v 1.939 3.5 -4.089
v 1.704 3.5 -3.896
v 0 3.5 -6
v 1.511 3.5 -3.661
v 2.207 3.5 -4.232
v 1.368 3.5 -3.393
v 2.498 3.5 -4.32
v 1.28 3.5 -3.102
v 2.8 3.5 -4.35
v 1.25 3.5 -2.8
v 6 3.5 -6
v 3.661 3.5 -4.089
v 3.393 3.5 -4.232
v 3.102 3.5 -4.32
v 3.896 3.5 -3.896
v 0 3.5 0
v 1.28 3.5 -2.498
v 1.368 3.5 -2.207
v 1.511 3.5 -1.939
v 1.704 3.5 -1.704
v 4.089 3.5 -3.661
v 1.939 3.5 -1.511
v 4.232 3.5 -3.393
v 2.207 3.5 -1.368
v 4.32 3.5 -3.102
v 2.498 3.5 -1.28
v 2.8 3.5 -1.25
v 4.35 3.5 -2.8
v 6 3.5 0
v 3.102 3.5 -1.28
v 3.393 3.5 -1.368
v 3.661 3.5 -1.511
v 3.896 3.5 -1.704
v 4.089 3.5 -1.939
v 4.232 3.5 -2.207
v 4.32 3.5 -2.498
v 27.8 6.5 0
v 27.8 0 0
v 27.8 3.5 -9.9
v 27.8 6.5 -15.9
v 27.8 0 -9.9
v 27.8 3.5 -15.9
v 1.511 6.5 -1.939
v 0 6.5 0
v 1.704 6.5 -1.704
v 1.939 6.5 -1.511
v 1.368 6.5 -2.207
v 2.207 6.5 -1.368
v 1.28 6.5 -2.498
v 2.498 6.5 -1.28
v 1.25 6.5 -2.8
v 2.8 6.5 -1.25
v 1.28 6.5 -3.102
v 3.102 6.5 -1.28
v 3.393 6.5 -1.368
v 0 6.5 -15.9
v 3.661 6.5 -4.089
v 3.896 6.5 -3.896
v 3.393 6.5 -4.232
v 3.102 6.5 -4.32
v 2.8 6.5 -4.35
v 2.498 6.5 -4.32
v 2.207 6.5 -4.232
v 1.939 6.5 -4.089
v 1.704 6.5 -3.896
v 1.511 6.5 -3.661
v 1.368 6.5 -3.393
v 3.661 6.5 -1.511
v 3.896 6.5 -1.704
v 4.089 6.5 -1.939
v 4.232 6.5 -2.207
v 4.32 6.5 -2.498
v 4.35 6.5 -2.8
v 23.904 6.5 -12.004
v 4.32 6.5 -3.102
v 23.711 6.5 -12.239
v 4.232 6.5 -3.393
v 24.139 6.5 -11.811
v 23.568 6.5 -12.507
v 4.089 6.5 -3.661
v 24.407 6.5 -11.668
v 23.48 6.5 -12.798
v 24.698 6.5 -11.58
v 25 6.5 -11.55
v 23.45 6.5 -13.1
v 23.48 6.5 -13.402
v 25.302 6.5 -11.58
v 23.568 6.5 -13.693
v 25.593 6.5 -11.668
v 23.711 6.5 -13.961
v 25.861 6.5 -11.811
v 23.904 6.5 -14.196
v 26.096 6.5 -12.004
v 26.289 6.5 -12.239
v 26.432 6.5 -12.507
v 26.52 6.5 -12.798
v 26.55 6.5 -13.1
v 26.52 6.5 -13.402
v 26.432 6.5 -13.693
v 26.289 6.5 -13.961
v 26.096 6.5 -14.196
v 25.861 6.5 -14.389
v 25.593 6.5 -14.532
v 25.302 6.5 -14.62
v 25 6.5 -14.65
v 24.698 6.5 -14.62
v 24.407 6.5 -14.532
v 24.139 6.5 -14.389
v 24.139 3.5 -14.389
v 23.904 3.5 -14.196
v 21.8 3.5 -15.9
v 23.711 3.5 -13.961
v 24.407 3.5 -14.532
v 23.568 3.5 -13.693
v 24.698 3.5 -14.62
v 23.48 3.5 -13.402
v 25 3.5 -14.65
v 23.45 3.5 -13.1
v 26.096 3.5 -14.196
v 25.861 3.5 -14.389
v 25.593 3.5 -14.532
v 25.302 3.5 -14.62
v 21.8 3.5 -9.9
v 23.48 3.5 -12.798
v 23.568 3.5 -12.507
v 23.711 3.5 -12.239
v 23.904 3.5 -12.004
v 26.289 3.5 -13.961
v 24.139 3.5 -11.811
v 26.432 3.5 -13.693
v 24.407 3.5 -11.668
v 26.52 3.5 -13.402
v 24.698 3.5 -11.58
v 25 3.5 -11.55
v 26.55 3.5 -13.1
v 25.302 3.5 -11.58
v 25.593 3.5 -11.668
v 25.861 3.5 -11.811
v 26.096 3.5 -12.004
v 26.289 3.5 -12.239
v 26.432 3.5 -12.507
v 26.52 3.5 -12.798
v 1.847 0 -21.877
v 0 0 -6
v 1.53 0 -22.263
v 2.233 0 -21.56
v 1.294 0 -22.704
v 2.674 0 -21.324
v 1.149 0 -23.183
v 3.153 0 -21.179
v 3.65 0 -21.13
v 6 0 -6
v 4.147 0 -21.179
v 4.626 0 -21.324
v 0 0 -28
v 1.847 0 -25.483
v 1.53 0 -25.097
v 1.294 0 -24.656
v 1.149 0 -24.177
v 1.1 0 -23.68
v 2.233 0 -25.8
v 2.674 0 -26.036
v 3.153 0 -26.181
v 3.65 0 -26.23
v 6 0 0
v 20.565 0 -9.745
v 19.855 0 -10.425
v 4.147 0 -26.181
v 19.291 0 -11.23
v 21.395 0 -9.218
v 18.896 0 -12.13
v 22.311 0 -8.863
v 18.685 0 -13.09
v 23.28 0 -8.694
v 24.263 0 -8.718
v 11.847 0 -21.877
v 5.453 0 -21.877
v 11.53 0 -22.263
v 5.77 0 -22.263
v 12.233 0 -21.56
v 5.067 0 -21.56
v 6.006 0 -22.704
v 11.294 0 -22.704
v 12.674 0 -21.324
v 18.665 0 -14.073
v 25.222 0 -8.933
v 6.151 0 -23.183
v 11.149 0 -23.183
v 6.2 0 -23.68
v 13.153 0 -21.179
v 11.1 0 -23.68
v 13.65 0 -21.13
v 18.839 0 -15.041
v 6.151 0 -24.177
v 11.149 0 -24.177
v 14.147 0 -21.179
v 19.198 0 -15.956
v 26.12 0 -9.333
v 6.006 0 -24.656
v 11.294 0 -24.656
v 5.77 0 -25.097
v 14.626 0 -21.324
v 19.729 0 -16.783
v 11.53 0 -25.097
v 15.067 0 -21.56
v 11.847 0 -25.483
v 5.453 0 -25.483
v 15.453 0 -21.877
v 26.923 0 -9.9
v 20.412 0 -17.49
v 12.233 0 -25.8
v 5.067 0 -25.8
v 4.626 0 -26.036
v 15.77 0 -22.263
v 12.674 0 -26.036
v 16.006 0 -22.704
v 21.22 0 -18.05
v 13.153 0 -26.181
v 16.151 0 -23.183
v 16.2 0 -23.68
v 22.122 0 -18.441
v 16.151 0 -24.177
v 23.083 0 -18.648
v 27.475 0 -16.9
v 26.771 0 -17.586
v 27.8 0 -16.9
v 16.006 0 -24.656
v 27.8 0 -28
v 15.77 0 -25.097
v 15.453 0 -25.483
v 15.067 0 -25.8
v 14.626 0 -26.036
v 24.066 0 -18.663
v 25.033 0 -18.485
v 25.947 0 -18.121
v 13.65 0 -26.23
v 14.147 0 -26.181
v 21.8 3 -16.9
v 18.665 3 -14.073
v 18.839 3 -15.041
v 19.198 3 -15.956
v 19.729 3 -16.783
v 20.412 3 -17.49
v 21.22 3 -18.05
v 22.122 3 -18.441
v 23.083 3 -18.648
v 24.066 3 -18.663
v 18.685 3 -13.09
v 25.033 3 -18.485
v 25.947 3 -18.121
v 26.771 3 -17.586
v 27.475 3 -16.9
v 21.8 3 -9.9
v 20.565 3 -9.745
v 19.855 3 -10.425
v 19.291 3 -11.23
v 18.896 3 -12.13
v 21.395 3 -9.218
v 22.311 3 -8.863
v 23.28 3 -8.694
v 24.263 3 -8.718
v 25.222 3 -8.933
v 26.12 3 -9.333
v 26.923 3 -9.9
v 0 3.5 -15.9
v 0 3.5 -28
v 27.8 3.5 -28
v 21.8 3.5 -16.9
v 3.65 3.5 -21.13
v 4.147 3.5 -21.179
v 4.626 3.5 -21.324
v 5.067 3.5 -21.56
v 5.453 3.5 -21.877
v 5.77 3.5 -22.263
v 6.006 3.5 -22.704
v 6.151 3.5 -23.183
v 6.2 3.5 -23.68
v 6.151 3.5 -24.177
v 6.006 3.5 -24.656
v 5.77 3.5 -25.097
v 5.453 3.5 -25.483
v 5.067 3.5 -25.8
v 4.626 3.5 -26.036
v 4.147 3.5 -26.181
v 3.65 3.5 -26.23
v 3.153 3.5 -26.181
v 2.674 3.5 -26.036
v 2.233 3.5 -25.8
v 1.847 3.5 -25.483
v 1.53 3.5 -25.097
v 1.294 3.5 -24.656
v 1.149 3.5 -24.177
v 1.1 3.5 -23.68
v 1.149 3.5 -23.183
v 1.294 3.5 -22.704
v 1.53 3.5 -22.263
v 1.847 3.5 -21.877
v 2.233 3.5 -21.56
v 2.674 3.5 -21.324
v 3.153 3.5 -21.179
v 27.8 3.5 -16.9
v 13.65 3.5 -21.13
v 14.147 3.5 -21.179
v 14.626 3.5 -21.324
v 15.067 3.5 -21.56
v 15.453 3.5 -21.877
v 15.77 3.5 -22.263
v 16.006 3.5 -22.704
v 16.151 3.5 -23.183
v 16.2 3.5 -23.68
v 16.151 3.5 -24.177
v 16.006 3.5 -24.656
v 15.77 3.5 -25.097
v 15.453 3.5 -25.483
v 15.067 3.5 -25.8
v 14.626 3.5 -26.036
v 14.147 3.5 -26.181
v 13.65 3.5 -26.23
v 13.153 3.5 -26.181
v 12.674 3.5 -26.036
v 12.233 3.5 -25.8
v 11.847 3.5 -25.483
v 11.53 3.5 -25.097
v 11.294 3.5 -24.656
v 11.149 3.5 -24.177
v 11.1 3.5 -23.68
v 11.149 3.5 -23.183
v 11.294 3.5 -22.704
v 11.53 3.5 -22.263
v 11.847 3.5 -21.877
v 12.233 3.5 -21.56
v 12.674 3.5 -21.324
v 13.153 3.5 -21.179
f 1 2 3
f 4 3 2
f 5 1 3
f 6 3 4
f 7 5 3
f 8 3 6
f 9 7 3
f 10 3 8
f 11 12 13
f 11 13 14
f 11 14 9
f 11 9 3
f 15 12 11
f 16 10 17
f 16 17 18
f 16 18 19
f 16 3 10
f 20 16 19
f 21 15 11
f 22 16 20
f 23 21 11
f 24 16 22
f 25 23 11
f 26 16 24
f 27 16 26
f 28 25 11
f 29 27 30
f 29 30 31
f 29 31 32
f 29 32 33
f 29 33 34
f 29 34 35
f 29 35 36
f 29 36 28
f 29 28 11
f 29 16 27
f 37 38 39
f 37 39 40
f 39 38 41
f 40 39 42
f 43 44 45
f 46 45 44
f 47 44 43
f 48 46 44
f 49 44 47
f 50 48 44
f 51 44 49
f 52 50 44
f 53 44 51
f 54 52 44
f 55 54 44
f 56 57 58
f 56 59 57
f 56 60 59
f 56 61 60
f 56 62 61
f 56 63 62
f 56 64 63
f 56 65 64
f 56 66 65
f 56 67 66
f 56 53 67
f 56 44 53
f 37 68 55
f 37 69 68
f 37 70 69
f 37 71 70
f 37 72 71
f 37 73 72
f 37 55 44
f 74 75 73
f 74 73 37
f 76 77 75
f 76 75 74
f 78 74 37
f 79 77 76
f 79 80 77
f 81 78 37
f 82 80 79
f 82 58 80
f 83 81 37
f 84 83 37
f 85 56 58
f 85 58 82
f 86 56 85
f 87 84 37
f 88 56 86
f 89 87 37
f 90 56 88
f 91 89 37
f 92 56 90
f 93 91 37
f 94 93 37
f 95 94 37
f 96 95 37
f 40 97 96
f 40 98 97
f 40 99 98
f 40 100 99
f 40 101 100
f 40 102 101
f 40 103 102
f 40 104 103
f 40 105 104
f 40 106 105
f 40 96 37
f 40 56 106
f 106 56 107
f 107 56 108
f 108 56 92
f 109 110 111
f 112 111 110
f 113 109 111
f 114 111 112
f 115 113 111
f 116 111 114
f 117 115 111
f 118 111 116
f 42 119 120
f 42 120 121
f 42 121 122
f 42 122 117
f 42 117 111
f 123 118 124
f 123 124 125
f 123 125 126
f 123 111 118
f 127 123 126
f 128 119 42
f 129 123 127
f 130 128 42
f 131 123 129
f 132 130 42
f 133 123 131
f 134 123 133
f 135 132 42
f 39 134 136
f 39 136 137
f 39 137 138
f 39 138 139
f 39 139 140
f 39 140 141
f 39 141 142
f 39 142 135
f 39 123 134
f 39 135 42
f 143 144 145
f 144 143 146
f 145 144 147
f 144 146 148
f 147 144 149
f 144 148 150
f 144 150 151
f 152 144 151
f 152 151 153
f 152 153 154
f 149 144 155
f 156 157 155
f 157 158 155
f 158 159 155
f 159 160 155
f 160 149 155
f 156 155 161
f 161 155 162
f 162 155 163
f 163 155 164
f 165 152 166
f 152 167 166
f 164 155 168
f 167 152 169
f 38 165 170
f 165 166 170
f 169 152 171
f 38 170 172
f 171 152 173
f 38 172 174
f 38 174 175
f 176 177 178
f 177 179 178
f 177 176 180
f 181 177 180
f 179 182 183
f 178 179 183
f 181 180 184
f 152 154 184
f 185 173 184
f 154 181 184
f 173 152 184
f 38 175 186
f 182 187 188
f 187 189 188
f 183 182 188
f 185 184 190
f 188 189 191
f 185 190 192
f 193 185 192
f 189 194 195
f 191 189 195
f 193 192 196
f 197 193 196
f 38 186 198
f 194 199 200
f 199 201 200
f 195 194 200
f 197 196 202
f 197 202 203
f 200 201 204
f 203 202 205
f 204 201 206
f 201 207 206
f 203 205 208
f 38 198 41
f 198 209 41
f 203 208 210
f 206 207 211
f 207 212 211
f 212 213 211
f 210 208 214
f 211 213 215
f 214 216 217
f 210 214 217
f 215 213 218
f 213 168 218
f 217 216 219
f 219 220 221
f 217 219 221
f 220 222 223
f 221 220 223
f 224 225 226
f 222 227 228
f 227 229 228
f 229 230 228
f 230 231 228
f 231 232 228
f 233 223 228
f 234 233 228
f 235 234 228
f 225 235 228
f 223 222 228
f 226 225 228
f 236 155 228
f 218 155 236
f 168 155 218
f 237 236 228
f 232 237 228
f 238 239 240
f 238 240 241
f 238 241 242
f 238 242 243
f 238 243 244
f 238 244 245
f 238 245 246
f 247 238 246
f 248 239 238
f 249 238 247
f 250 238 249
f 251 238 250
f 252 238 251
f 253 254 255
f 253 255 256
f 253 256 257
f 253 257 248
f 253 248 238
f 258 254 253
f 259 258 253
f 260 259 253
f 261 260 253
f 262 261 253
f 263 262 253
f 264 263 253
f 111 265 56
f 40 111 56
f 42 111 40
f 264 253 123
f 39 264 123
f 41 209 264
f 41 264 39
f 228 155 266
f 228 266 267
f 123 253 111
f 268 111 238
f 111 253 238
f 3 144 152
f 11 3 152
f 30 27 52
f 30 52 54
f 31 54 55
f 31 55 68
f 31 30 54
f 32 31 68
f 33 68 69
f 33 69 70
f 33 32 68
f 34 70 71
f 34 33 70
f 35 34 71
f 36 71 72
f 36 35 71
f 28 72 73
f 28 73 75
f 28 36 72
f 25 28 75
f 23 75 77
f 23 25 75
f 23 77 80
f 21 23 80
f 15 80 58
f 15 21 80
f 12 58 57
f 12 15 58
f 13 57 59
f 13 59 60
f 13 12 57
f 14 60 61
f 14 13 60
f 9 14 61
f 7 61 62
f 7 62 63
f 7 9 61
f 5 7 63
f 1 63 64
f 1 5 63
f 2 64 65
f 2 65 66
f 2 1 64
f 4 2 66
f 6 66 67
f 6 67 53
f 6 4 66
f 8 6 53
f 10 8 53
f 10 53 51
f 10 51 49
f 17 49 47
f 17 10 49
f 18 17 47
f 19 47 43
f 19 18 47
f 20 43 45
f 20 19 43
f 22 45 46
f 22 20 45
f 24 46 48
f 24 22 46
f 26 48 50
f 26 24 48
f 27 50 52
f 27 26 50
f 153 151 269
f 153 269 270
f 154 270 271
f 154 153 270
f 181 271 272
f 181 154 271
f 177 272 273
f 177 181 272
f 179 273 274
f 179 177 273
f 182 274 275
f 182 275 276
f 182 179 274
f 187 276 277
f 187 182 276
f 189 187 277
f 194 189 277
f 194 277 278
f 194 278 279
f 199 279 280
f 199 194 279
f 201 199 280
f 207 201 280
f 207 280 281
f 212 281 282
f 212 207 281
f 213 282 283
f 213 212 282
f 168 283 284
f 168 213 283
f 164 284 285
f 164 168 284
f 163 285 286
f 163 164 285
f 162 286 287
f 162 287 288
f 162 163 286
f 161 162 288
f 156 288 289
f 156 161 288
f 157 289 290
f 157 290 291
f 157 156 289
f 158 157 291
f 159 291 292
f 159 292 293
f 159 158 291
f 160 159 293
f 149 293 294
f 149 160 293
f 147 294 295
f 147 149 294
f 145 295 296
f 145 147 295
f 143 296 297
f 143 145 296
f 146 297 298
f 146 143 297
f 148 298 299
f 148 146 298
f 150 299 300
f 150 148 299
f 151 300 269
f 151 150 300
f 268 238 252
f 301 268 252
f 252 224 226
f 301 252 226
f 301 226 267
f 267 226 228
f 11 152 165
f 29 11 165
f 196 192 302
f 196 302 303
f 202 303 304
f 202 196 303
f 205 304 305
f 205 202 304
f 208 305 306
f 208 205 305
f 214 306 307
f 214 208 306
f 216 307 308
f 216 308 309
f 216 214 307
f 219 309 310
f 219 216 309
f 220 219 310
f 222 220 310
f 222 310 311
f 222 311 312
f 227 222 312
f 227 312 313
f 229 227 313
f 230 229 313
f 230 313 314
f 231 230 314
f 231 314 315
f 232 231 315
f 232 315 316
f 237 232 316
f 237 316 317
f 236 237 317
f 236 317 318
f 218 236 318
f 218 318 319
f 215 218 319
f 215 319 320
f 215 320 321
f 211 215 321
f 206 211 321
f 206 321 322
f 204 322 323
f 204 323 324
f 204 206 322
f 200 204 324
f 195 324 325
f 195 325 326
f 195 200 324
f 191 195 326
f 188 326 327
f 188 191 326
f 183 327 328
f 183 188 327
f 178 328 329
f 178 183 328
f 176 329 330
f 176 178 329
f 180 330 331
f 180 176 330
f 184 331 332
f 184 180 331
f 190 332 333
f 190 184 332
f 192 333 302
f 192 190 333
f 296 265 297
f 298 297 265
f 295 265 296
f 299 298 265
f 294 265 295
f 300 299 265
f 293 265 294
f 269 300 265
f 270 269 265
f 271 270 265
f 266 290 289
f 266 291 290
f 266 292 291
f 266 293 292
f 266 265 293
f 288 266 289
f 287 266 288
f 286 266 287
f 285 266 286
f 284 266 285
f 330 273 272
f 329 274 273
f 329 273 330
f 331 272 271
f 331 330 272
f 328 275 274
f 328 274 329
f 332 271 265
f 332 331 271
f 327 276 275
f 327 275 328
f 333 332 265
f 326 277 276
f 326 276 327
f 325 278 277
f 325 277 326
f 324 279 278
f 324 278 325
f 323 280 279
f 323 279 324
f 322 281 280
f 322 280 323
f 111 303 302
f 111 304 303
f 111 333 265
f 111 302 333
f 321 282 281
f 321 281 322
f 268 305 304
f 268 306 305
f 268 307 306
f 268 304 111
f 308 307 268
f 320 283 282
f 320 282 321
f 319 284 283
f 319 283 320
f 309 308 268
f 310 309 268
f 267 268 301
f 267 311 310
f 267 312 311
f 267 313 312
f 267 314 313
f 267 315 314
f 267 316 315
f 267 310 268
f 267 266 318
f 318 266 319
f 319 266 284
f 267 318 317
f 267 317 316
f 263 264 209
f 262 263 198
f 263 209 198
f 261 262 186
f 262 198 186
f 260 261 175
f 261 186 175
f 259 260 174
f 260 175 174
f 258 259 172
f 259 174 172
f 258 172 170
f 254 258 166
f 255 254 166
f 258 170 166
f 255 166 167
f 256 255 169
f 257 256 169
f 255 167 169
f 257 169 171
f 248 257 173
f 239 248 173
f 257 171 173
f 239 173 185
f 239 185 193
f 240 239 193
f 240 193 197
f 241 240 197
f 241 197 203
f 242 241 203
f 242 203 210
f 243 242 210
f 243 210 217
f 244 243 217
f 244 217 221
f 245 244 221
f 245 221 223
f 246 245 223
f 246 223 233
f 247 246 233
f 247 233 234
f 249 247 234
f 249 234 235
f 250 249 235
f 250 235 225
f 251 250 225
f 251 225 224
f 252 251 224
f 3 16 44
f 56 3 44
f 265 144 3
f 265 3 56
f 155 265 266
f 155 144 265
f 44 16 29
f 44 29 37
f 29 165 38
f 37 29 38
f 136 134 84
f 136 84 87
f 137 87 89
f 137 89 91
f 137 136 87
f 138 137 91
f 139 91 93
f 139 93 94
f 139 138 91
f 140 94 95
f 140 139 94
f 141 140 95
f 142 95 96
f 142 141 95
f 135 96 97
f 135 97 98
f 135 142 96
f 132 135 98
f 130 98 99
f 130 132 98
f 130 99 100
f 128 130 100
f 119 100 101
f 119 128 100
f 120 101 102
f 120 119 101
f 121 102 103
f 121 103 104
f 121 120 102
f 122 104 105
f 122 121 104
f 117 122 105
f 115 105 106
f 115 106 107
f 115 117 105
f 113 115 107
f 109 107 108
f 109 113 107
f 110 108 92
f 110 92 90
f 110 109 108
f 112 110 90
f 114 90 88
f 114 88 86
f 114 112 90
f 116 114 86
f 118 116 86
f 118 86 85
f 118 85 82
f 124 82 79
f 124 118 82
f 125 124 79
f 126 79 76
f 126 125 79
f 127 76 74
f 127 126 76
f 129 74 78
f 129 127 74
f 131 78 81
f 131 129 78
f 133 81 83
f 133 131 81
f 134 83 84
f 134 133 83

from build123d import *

# Parameters (mm, degrees)
SKETCH1_W           = 27.8
SKETCH1_H           = 28
SKETCH1_R           = 2.55
BOSS_EXTRUDE1_DEPTH = 3.5
SKETCH2_W           = 27.8
SKETCH2_H           = 15.9
SKETCH2_R           = 1.55
BOSS_EXTRUDE2_DEPTH = 3
SKETCH3_W           = 6
SKETCH3_H           = 6
CUT_EXTRUDE5_DEPTH  = 3.5
SKETCH4_W           = 6
SKETCH4_H           = 6
SKETCH4_H_2         = 1
CUT_EXTRUDE7_DEPTH  = 3.5
SKETCH5_R           = 2.55
SKETCH5_R_2         = 5
CUT_EXTRUDE8_DEPTH  = 3


with BuildPart() as part:
    # Sketch1 → Boss-Extrude1 (new body)
    with BuildSketch(Plane(origin=(0, 0, 0), x_dir=(1, 0, 0), z_dir=(0, 1, 0))):
        with Locations((13.9, 14)):
            Rectangle(SKETCH1_W, SKETCH1_H)
        with Locations(Location((13.65, 23.68, 0), (0, 0, 270))):
            Circle(SKETCH1_R, mode=Mode.SUBTRACT)
        with Locations(Location((3.65, 23.68, 0), (0, 0, 270))):
            Circle(SKETCH1_R, mode=Mode.SUBTRACT)
    extrude(amount=BOSS_EXTRUDE1_DEPTH)

    # Sketch2 → Boss-Extrude2 (add)
    with BuildSketch(Plane(origin=(0, 3.5, 0), x_dir=(1, 0, 0), z_dir=(0, 1, 0))):
        with Locations((13.9, 7.95)):
            Rectangle(SKETCH2_W, SKETCH2_H)
        with Locations(Location((2.8, 2.8, 0), (0, 0, 270))):
            Circle(SKETCH2_R, mode=Mode.SUBTRACT)
        with Locations(Location((25, 13.1, 0), (0, 0, 270))):
            Circle(SKETCH2_R, mode=Mode.SUBTRACT)
    extrude(amount=BOSS_EXTRUDE2_DEPTH)

    # Sketch3 → Cut-Extrude5 (cut)
    with BuildSketch(Plane.XZ):
        with Locations((3, -3)):
            Rectangle(SKETCH3_W, SKETCH3_H)
    extrude(amount=-CUT_EXTRUDE5_DEPTH, mode=Mode.SUBTRACT)

    # Sketch4 → Cut-Extrude7 (cut)
    with BuildSketch(Plane.XZ):
        with Locations((24.8, -12.9)):
            Rectangle(SKETCH4_W, SKETCH4_H)
        with Locations((24.8, -16.4)):
            Rectangle(SKETCH4_W, SKETCH4_H_2)
    extrude(amount=-CUT_EXTRUDE7_DEPTH, mode=Mode.SUBTRACT)

    # Sketch5 → Cut-Extrude8 (cut)
    with BuildSketch(Plane.XZ):
        with Locations(Location((13.65, -23.68, 0), (0, 0, 90))):
            Circle(SKETCH5_R)
        with Locations((23.65, -13.68)):
            Circle(SKETCH5_R_2)
    extrude(amount=-CUT_EXTRUDE8_DEPTH, mode=Mode.SUBTRACT)


solid = part.part
